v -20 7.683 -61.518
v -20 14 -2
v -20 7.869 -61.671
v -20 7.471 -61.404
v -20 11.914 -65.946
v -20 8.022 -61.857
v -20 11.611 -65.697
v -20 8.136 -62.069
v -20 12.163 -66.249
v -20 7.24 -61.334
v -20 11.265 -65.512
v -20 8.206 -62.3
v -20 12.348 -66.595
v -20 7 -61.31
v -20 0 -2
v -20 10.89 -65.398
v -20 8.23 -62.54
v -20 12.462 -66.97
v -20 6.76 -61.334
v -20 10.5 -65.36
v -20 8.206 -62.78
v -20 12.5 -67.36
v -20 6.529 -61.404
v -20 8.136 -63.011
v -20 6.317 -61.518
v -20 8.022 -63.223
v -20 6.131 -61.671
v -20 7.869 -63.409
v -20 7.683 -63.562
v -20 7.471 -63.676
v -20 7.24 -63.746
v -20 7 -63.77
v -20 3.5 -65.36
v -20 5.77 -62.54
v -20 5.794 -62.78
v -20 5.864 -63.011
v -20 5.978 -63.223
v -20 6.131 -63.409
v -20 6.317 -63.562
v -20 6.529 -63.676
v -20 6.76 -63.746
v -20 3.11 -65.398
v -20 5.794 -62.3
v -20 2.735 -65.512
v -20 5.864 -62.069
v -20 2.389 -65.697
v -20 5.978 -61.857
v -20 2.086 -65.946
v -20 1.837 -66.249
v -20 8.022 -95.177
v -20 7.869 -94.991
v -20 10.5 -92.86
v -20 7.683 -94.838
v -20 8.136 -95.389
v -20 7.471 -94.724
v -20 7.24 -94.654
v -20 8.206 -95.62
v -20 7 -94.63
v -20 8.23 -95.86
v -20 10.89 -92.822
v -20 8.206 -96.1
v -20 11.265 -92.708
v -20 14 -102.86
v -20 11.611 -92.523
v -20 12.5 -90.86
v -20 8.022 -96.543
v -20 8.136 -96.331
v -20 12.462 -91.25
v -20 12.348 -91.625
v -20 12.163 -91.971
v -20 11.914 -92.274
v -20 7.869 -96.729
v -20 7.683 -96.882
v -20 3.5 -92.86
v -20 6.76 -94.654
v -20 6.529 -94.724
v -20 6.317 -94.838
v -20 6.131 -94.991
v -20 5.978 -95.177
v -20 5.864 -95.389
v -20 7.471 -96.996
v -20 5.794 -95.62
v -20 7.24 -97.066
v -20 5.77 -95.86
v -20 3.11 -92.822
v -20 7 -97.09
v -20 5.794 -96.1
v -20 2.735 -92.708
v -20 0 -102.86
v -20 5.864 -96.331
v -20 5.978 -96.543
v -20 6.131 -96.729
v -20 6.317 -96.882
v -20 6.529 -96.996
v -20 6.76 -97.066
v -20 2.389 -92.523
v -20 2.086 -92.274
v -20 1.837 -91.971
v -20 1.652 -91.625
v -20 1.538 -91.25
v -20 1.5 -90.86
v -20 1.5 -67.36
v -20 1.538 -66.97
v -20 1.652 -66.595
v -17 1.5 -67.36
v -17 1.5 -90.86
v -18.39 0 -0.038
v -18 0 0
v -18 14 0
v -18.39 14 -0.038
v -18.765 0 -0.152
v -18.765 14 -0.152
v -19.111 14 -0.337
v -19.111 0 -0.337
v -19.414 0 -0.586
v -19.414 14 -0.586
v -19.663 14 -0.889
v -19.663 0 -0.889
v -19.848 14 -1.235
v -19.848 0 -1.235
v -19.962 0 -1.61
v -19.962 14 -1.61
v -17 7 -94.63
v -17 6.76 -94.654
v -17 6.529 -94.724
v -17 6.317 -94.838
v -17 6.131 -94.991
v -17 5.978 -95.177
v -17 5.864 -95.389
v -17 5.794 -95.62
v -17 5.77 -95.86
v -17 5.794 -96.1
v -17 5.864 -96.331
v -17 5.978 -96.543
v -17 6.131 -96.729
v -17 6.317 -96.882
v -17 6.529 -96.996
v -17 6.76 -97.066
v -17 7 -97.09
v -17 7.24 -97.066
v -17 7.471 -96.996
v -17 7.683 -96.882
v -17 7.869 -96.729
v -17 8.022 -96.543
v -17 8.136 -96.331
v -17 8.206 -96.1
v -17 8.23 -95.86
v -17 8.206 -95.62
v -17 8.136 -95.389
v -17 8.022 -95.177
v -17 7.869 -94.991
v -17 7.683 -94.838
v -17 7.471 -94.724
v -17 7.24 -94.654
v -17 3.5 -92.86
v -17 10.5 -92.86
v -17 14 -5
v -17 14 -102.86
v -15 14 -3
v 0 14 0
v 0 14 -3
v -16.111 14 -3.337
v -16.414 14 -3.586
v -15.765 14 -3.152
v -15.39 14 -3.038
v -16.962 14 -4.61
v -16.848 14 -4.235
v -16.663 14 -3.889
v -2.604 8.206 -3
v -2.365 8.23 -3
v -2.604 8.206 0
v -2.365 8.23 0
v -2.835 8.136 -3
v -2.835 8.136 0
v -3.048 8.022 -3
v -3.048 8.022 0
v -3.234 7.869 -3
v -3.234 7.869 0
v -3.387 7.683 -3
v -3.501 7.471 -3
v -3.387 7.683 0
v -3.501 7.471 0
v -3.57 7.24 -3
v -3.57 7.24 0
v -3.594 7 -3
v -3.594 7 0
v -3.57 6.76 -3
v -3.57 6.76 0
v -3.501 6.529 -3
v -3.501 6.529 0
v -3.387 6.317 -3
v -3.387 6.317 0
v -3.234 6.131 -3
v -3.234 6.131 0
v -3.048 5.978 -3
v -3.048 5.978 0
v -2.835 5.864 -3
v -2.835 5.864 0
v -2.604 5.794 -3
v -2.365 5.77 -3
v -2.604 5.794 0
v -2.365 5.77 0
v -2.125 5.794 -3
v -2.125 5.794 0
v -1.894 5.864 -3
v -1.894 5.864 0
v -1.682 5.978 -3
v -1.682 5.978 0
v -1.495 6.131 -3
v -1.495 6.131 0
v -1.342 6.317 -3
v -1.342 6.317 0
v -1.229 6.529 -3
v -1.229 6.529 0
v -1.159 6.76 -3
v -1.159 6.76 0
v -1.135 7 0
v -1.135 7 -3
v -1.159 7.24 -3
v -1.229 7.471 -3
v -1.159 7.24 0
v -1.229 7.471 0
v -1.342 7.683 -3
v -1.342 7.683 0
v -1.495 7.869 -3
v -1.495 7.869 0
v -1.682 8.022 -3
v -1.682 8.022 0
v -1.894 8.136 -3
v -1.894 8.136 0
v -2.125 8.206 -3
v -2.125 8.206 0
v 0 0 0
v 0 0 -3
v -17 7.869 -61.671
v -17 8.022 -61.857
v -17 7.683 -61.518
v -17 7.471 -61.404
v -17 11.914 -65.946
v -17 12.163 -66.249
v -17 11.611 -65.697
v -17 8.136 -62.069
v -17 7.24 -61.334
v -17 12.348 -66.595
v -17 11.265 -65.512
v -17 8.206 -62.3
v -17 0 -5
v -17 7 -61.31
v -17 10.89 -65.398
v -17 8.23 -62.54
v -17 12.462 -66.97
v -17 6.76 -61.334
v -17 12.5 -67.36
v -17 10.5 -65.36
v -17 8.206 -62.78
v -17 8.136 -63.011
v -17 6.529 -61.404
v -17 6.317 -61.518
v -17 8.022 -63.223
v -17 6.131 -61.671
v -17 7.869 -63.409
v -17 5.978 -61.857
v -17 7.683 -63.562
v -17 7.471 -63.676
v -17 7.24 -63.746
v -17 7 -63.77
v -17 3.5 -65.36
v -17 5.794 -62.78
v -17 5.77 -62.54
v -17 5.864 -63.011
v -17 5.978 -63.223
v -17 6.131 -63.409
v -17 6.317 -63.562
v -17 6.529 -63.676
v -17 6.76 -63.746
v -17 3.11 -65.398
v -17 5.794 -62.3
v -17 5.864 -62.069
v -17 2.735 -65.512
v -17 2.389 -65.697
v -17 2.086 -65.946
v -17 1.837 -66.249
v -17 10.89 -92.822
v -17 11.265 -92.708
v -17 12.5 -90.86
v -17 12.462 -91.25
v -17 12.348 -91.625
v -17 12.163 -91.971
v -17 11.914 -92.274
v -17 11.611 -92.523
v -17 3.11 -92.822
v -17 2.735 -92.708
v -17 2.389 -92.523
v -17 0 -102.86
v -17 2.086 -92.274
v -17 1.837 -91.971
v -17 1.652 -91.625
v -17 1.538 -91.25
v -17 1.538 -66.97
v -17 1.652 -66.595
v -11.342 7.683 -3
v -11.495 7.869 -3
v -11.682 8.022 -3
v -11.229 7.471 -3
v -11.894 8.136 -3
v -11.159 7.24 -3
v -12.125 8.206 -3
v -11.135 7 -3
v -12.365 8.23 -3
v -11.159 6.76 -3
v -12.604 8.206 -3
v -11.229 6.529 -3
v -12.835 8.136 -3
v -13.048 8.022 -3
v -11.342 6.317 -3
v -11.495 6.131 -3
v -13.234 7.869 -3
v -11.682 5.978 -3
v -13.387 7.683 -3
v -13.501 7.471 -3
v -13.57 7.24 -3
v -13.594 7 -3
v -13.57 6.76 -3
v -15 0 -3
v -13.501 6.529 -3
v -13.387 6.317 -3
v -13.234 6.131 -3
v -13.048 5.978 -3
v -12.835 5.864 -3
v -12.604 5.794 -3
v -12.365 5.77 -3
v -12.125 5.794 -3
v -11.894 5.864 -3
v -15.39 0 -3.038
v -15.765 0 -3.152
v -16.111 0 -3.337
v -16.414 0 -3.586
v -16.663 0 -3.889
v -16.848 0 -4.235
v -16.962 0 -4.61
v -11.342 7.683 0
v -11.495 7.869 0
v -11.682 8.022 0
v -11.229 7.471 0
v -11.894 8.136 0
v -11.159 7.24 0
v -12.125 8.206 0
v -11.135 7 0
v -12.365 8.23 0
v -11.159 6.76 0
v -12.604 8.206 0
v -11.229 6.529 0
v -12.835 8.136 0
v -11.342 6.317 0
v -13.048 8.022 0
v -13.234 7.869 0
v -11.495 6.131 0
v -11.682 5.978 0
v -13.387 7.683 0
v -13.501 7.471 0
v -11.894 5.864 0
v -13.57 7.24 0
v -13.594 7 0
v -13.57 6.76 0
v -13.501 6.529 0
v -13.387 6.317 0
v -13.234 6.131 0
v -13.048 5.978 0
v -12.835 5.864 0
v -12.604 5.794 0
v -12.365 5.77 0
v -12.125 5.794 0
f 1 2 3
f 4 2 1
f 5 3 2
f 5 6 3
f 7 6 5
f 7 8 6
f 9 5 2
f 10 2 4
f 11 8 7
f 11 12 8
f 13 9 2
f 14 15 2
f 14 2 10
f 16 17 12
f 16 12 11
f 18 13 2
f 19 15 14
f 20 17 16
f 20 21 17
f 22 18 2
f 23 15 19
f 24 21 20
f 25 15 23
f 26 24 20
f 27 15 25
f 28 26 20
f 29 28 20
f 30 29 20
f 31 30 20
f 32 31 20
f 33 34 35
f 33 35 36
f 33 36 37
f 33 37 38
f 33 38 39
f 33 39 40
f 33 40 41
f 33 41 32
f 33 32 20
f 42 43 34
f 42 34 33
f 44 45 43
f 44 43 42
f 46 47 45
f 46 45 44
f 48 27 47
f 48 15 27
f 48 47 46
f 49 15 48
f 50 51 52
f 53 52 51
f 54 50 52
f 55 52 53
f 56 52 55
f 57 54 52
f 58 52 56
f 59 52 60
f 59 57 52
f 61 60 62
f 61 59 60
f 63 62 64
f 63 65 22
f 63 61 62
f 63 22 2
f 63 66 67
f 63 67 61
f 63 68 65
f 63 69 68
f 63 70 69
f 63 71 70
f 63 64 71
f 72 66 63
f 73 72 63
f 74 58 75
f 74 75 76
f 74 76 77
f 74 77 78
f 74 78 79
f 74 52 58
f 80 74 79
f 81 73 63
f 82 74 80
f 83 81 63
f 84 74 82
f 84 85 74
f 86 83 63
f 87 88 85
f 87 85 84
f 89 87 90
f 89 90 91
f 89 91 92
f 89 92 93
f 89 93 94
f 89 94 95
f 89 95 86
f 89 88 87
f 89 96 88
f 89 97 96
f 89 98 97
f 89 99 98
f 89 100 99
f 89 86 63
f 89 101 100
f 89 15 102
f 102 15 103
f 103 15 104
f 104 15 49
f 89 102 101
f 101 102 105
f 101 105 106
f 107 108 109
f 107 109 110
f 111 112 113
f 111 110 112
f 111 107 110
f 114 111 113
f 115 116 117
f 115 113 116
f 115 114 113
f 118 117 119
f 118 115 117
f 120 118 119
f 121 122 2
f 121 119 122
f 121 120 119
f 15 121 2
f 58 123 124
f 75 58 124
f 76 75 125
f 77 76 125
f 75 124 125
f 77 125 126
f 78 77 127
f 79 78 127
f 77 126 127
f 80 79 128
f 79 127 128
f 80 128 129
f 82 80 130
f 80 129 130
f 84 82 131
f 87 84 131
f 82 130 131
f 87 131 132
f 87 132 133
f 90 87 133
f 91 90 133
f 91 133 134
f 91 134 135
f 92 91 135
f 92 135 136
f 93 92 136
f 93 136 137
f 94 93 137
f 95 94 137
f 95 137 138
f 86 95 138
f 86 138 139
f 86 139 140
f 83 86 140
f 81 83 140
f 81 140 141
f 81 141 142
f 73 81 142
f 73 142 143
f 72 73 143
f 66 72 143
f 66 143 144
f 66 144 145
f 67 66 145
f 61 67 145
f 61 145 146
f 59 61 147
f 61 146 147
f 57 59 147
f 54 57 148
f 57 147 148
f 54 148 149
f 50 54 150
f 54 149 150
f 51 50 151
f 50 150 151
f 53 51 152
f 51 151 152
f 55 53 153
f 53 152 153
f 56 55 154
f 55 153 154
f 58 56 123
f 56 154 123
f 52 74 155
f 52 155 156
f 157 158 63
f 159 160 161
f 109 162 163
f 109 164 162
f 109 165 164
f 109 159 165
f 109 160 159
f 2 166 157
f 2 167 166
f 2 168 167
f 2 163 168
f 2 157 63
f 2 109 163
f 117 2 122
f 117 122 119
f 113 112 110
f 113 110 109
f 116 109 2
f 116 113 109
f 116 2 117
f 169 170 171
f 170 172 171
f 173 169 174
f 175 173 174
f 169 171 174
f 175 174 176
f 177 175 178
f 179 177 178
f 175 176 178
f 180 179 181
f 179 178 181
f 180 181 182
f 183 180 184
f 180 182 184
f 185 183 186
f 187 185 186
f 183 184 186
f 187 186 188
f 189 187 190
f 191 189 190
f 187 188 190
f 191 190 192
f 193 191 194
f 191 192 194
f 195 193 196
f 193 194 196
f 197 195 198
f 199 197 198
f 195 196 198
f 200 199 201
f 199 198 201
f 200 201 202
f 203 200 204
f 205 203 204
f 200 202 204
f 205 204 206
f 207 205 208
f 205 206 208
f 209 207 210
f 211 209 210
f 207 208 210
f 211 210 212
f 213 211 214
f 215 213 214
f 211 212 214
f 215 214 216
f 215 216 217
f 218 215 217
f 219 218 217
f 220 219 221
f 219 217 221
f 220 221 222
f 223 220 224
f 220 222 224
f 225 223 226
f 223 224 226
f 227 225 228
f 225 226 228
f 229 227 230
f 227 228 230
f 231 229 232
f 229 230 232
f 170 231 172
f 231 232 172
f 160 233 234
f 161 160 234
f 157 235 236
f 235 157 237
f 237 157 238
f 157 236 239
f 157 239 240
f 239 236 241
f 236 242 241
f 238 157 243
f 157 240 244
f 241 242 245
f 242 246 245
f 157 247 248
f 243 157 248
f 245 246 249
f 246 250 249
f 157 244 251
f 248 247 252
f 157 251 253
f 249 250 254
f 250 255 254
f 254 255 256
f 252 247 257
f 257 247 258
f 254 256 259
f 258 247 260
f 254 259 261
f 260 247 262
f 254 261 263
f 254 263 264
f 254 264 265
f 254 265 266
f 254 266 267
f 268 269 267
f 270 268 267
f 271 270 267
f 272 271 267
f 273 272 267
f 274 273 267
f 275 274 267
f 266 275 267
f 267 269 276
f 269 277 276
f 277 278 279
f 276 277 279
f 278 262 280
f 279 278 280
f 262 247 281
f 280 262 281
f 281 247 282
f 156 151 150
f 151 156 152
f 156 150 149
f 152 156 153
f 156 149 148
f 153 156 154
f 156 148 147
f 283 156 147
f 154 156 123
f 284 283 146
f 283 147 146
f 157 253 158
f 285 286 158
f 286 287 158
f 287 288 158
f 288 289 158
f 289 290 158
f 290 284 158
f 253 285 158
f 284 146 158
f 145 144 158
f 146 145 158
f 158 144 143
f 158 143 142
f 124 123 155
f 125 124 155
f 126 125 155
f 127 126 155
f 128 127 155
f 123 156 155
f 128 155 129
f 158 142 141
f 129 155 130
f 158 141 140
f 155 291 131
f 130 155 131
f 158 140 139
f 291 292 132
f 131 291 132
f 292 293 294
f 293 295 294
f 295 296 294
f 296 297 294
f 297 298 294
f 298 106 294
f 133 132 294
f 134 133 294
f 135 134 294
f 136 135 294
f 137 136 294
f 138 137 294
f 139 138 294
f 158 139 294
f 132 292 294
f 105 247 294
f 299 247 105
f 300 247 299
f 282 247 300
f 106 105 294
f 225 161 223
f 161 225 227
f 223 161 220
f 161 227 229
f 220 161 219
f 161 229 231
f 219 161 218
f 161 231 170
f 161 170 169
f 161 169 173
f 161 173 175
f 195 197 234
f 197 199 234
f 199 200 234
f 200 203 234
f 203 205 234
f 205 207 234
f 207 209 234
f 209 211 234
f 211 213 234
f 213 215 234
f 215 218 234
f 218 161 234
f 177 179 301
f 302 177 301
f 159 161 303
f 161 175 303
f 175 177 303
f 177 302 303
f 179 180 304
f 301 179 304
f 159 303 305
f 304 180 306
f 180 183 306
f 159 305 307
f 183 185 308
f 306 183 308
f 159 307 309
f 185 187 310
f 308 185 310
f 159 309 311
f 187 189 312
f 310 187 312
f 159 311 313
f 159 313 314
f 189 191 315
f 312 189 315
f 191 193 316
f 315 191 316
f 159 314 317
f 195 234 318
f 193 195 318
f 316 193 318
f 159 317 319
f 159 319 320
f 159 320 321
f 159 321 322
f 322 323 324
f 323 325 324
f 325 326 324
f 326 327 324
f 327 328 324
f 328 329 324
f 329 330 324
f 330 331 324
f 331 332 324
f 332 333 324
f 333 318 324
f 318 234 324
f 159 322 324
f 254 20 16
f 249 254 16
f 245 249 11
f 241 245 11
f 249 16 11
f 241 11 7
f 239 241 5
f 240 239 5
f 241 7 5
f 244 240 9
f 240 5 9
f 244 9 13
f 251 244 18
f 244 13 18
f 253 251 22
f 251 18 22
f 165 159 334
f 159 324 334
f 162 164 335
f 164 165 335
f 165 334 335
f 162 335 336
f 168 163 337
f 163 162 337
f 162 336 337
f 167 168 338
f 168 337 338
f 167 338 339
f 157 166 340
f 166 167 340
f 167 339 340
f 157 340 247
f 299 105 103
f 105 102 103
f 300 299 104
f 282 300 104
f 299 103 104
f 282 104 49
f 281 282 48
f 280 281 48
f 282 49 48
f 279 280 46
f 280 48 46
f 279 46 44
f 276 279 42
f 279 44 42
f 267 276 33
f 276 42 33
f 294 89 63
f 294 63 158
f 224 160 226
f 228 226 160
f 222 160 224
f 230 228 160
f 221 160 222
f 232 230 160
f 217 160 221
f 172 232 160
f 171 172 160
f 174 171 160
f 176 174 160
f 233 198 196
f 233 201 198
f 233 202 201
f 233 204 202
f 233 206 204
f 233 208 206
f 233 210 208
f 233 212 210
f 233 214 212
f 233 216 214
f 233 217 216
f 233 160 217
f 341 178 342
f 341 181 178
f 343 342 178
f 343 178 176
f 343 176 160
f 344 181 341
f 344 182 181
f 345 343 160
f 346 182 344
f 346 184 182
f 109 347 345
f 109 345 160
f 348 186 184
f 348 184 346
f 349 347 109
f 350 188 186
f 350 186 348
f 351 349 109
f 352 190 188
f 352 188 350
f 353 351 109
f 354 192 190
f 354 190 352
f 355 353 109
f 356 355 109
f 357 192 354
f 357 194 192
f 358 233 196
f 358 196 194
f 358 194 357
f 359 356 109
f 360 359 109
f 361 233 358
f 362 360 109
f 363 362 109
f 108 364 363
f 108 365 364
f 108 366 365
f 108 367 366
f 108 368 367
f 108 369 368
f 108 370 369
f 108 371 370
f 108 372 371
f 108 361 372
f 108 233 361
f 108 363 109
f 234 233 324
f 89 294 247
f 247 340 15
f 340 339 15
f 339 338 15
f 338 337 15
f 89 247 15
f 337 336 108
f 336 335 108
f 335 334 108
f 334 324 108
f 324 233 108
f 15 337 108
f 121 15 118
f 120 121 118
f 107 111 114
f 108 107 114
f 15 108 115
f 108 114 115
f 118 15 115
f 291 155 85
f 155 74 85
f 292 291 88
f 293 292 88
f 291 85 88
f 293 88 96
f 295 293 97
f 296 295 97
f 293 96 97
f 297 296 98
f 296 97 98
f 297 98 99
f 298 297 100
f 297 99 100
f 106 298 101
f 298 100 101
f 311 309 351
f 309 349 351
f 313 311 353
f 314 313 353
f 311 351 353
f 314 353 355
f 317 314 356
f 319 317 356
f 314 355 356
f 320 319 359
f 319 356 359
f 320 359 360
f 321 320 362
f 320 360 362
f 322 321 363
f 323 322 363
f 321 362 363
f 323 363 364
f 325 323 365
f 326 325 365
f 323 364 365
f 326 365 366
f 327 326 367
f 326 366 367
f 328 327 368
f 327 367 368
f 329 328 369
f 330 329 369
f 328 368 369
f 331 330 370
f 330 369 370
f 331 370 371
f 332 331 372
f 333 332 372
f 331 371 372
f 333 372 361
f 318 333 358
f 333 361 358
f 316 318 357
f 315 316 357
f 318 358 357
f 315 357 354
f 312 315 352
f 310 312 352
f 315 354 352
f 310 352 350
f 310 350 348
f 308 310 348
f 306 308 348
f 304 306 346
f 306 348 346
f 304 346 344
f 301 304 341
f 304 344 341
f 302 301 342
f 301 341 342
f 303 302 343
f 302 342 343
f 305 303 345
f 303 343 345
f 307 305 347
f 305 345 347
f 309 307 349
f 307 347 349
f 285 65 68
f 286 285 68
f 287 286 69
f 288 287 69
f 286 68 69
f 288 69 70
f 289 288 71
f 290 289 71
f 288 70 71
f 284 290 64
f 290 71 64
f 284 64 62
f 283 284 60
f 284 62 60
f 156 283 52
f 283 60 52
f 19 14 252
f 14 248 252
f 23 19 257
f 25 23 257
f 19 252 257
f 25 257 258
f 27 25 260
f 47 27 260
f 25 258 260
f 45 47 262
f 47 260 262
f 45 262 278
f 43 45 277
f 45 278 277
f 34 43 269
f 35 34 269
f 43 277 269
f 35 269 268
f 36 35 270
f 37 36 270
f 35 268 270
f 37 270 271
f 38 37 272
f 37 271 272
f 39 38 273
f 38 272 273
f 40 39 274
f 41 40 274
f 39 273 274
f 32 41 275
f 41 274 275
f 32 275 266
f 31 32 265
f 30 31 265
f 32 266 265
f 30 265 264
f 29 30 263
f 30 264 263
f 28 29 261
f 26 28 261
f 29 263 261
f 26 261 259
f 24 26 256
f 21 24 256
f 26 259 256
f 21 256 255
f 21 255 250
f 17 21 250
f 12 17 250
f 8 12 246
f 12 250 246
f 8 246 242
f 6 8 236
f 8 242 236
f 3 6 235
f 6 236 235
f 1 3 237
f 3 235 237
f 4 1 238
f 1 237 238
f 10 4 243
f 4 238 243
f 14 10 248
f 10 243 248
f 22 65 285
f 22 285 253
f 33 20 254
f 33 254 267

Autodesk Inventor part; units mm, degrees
ref_plane "YZ Plane" through (0, 0, 0) normal (1, 0, 0) x (0, 1, 0)
ref_plane "XZ Plane" through (0, 0, 0) normal (0, 1, 0) x (-1, 0, 0)
ref_plane "XY Plane" through (0, 0, 0) normal (0, 0, 1) x (1, 0, 0)
sketch "Sketch1" plane through (0, 0, 0) normal (0, 1, 0) x (-1, 0, 0)
  line L0 (0, 0) -> (0, -3)
  line L1 (0, -3) -> (15, -3)
  line L2 (17, -5) -> (17, -102.86)
  line L3 (0, 0) -> (18, 0)
  line L4 (20, -2) -> (20, -102.86)
  line L5 (20, -102.86) -> (17, -102.86)
  arc A0 (17, -5) -> (15, -3) centre (15, -5) ccw
  arc A1 (20, -2) -> (18, 0) centre (18, -2) ccw
  point P0 (17, -3)
  point P1 (20, 0)
  dimension "d0" = 3
  dimension "d1" = 17
  dimension "d2" = 99.86
  dimension "d3" = 20
  dimension "d4" = 2
extrude "Extrusion1" add sketch "Sketch1" along normal blind 14
sketch "Sketch2" plane through (0, 0, -3) normal (0, 0, -1) x (-1, 0, 0)
  point P0 (0, 0)
sketch "Sketch3" plane through (0, 0, -3) normal (0, 0, -1) x (-1, 0, 0)
  circle A0 centre (2.3646, 7) radius 1.5
  circle A1 centre (12.3646, 7) radius 1.5
  line L0 (0, 14) -> (15, 14) projected
  line L1 (0, 0) -> (15, 0) projected
  dimension "d7" = 3
  dimension "d8" = 3
  dimension "d9" = 14
  dimension "d10" = 7
  dimension "d11" = 10
hole "Hole1" at (-2.3646, 7, -3) at (-12.3646, 7, -3) direction (0, 0, 1) diameter 2.459 depth 8.8 tip angle 118 thread size "M3x0.5" class "6H" standard "ISO Metric profile"
sketch "Sketch4" plane through (-20, 0, -102.86) normal (-1, 0, 0) x (0, 0, 1)
  line L0 (12, 12.5) -> (35.5, 12.5)
  line L1 (37.5, 10.5) -> (37.5, 3.5)
  line L2 (35.5, 1.5) -> (12, 1.5)
  line L3 (10, 3.5) -> (10, 10.5)
  line L4 (0, 14) -> (100.86, 14) projected
  line L5 (0, 0) -> (100.86, 0) projected
  line L6 (0, 0) -> (0, 14) projected
  circle A0 centre (7, 7) radius 1.5
  circle A1 centre (40.32, 7) radius 1.5
  arc A2 (12, 12.5) -> (10, 10.5) centre (12, 10.5) ccw
  arc A3 (10, 3.5) -> (12, 1.5) centre (12, 3.5) ccw
  arc A4 (37.5, 10.5) -> (35.5, 12.5) centre (35.5, 10.5) ccw
  arc A5 (35.5, 1.5) -> (37.5, 3.5) centre (35.5, 3.5) ccw
  point P0 (102.86, 0)
  point P1 (10, 12.5)
  point P2 (37.5, 1.5)
  point P3 (37.5, 12.5)
  point P4 (10, 1.5)
  dimension "d19" = 27.5
  dimension "d20" = 11
  dimension "d21" = 14
  dimension "d22" = 1.5
  dimension "d23" = 10
  dimension "d24" = 3
  dimension "d25" = 3
  dimension "d26" = 33.32
  dimension "d29" = 7
  dimension "d39" = 2
hole "Hole2" at (-20, 7, -62.54) at (-20, 7, -95.86) direction (1, 0, 0) diameter 2.459 depth 8.8 tip angle 118 thread size "M3x0.5" class "6H" standard "ISO Metric profile"
extrude "Extrusion2" cut sketch "Sketch4" against normal blind 14 contours L0 A4 L1 A5 L2 A3 L3 A2
equation "\"d10\" = 0.5 * d9"
equation "\"d22\" = -0.5 * d20 + 0.5 * d21"
properties part number "płytka złącza"
